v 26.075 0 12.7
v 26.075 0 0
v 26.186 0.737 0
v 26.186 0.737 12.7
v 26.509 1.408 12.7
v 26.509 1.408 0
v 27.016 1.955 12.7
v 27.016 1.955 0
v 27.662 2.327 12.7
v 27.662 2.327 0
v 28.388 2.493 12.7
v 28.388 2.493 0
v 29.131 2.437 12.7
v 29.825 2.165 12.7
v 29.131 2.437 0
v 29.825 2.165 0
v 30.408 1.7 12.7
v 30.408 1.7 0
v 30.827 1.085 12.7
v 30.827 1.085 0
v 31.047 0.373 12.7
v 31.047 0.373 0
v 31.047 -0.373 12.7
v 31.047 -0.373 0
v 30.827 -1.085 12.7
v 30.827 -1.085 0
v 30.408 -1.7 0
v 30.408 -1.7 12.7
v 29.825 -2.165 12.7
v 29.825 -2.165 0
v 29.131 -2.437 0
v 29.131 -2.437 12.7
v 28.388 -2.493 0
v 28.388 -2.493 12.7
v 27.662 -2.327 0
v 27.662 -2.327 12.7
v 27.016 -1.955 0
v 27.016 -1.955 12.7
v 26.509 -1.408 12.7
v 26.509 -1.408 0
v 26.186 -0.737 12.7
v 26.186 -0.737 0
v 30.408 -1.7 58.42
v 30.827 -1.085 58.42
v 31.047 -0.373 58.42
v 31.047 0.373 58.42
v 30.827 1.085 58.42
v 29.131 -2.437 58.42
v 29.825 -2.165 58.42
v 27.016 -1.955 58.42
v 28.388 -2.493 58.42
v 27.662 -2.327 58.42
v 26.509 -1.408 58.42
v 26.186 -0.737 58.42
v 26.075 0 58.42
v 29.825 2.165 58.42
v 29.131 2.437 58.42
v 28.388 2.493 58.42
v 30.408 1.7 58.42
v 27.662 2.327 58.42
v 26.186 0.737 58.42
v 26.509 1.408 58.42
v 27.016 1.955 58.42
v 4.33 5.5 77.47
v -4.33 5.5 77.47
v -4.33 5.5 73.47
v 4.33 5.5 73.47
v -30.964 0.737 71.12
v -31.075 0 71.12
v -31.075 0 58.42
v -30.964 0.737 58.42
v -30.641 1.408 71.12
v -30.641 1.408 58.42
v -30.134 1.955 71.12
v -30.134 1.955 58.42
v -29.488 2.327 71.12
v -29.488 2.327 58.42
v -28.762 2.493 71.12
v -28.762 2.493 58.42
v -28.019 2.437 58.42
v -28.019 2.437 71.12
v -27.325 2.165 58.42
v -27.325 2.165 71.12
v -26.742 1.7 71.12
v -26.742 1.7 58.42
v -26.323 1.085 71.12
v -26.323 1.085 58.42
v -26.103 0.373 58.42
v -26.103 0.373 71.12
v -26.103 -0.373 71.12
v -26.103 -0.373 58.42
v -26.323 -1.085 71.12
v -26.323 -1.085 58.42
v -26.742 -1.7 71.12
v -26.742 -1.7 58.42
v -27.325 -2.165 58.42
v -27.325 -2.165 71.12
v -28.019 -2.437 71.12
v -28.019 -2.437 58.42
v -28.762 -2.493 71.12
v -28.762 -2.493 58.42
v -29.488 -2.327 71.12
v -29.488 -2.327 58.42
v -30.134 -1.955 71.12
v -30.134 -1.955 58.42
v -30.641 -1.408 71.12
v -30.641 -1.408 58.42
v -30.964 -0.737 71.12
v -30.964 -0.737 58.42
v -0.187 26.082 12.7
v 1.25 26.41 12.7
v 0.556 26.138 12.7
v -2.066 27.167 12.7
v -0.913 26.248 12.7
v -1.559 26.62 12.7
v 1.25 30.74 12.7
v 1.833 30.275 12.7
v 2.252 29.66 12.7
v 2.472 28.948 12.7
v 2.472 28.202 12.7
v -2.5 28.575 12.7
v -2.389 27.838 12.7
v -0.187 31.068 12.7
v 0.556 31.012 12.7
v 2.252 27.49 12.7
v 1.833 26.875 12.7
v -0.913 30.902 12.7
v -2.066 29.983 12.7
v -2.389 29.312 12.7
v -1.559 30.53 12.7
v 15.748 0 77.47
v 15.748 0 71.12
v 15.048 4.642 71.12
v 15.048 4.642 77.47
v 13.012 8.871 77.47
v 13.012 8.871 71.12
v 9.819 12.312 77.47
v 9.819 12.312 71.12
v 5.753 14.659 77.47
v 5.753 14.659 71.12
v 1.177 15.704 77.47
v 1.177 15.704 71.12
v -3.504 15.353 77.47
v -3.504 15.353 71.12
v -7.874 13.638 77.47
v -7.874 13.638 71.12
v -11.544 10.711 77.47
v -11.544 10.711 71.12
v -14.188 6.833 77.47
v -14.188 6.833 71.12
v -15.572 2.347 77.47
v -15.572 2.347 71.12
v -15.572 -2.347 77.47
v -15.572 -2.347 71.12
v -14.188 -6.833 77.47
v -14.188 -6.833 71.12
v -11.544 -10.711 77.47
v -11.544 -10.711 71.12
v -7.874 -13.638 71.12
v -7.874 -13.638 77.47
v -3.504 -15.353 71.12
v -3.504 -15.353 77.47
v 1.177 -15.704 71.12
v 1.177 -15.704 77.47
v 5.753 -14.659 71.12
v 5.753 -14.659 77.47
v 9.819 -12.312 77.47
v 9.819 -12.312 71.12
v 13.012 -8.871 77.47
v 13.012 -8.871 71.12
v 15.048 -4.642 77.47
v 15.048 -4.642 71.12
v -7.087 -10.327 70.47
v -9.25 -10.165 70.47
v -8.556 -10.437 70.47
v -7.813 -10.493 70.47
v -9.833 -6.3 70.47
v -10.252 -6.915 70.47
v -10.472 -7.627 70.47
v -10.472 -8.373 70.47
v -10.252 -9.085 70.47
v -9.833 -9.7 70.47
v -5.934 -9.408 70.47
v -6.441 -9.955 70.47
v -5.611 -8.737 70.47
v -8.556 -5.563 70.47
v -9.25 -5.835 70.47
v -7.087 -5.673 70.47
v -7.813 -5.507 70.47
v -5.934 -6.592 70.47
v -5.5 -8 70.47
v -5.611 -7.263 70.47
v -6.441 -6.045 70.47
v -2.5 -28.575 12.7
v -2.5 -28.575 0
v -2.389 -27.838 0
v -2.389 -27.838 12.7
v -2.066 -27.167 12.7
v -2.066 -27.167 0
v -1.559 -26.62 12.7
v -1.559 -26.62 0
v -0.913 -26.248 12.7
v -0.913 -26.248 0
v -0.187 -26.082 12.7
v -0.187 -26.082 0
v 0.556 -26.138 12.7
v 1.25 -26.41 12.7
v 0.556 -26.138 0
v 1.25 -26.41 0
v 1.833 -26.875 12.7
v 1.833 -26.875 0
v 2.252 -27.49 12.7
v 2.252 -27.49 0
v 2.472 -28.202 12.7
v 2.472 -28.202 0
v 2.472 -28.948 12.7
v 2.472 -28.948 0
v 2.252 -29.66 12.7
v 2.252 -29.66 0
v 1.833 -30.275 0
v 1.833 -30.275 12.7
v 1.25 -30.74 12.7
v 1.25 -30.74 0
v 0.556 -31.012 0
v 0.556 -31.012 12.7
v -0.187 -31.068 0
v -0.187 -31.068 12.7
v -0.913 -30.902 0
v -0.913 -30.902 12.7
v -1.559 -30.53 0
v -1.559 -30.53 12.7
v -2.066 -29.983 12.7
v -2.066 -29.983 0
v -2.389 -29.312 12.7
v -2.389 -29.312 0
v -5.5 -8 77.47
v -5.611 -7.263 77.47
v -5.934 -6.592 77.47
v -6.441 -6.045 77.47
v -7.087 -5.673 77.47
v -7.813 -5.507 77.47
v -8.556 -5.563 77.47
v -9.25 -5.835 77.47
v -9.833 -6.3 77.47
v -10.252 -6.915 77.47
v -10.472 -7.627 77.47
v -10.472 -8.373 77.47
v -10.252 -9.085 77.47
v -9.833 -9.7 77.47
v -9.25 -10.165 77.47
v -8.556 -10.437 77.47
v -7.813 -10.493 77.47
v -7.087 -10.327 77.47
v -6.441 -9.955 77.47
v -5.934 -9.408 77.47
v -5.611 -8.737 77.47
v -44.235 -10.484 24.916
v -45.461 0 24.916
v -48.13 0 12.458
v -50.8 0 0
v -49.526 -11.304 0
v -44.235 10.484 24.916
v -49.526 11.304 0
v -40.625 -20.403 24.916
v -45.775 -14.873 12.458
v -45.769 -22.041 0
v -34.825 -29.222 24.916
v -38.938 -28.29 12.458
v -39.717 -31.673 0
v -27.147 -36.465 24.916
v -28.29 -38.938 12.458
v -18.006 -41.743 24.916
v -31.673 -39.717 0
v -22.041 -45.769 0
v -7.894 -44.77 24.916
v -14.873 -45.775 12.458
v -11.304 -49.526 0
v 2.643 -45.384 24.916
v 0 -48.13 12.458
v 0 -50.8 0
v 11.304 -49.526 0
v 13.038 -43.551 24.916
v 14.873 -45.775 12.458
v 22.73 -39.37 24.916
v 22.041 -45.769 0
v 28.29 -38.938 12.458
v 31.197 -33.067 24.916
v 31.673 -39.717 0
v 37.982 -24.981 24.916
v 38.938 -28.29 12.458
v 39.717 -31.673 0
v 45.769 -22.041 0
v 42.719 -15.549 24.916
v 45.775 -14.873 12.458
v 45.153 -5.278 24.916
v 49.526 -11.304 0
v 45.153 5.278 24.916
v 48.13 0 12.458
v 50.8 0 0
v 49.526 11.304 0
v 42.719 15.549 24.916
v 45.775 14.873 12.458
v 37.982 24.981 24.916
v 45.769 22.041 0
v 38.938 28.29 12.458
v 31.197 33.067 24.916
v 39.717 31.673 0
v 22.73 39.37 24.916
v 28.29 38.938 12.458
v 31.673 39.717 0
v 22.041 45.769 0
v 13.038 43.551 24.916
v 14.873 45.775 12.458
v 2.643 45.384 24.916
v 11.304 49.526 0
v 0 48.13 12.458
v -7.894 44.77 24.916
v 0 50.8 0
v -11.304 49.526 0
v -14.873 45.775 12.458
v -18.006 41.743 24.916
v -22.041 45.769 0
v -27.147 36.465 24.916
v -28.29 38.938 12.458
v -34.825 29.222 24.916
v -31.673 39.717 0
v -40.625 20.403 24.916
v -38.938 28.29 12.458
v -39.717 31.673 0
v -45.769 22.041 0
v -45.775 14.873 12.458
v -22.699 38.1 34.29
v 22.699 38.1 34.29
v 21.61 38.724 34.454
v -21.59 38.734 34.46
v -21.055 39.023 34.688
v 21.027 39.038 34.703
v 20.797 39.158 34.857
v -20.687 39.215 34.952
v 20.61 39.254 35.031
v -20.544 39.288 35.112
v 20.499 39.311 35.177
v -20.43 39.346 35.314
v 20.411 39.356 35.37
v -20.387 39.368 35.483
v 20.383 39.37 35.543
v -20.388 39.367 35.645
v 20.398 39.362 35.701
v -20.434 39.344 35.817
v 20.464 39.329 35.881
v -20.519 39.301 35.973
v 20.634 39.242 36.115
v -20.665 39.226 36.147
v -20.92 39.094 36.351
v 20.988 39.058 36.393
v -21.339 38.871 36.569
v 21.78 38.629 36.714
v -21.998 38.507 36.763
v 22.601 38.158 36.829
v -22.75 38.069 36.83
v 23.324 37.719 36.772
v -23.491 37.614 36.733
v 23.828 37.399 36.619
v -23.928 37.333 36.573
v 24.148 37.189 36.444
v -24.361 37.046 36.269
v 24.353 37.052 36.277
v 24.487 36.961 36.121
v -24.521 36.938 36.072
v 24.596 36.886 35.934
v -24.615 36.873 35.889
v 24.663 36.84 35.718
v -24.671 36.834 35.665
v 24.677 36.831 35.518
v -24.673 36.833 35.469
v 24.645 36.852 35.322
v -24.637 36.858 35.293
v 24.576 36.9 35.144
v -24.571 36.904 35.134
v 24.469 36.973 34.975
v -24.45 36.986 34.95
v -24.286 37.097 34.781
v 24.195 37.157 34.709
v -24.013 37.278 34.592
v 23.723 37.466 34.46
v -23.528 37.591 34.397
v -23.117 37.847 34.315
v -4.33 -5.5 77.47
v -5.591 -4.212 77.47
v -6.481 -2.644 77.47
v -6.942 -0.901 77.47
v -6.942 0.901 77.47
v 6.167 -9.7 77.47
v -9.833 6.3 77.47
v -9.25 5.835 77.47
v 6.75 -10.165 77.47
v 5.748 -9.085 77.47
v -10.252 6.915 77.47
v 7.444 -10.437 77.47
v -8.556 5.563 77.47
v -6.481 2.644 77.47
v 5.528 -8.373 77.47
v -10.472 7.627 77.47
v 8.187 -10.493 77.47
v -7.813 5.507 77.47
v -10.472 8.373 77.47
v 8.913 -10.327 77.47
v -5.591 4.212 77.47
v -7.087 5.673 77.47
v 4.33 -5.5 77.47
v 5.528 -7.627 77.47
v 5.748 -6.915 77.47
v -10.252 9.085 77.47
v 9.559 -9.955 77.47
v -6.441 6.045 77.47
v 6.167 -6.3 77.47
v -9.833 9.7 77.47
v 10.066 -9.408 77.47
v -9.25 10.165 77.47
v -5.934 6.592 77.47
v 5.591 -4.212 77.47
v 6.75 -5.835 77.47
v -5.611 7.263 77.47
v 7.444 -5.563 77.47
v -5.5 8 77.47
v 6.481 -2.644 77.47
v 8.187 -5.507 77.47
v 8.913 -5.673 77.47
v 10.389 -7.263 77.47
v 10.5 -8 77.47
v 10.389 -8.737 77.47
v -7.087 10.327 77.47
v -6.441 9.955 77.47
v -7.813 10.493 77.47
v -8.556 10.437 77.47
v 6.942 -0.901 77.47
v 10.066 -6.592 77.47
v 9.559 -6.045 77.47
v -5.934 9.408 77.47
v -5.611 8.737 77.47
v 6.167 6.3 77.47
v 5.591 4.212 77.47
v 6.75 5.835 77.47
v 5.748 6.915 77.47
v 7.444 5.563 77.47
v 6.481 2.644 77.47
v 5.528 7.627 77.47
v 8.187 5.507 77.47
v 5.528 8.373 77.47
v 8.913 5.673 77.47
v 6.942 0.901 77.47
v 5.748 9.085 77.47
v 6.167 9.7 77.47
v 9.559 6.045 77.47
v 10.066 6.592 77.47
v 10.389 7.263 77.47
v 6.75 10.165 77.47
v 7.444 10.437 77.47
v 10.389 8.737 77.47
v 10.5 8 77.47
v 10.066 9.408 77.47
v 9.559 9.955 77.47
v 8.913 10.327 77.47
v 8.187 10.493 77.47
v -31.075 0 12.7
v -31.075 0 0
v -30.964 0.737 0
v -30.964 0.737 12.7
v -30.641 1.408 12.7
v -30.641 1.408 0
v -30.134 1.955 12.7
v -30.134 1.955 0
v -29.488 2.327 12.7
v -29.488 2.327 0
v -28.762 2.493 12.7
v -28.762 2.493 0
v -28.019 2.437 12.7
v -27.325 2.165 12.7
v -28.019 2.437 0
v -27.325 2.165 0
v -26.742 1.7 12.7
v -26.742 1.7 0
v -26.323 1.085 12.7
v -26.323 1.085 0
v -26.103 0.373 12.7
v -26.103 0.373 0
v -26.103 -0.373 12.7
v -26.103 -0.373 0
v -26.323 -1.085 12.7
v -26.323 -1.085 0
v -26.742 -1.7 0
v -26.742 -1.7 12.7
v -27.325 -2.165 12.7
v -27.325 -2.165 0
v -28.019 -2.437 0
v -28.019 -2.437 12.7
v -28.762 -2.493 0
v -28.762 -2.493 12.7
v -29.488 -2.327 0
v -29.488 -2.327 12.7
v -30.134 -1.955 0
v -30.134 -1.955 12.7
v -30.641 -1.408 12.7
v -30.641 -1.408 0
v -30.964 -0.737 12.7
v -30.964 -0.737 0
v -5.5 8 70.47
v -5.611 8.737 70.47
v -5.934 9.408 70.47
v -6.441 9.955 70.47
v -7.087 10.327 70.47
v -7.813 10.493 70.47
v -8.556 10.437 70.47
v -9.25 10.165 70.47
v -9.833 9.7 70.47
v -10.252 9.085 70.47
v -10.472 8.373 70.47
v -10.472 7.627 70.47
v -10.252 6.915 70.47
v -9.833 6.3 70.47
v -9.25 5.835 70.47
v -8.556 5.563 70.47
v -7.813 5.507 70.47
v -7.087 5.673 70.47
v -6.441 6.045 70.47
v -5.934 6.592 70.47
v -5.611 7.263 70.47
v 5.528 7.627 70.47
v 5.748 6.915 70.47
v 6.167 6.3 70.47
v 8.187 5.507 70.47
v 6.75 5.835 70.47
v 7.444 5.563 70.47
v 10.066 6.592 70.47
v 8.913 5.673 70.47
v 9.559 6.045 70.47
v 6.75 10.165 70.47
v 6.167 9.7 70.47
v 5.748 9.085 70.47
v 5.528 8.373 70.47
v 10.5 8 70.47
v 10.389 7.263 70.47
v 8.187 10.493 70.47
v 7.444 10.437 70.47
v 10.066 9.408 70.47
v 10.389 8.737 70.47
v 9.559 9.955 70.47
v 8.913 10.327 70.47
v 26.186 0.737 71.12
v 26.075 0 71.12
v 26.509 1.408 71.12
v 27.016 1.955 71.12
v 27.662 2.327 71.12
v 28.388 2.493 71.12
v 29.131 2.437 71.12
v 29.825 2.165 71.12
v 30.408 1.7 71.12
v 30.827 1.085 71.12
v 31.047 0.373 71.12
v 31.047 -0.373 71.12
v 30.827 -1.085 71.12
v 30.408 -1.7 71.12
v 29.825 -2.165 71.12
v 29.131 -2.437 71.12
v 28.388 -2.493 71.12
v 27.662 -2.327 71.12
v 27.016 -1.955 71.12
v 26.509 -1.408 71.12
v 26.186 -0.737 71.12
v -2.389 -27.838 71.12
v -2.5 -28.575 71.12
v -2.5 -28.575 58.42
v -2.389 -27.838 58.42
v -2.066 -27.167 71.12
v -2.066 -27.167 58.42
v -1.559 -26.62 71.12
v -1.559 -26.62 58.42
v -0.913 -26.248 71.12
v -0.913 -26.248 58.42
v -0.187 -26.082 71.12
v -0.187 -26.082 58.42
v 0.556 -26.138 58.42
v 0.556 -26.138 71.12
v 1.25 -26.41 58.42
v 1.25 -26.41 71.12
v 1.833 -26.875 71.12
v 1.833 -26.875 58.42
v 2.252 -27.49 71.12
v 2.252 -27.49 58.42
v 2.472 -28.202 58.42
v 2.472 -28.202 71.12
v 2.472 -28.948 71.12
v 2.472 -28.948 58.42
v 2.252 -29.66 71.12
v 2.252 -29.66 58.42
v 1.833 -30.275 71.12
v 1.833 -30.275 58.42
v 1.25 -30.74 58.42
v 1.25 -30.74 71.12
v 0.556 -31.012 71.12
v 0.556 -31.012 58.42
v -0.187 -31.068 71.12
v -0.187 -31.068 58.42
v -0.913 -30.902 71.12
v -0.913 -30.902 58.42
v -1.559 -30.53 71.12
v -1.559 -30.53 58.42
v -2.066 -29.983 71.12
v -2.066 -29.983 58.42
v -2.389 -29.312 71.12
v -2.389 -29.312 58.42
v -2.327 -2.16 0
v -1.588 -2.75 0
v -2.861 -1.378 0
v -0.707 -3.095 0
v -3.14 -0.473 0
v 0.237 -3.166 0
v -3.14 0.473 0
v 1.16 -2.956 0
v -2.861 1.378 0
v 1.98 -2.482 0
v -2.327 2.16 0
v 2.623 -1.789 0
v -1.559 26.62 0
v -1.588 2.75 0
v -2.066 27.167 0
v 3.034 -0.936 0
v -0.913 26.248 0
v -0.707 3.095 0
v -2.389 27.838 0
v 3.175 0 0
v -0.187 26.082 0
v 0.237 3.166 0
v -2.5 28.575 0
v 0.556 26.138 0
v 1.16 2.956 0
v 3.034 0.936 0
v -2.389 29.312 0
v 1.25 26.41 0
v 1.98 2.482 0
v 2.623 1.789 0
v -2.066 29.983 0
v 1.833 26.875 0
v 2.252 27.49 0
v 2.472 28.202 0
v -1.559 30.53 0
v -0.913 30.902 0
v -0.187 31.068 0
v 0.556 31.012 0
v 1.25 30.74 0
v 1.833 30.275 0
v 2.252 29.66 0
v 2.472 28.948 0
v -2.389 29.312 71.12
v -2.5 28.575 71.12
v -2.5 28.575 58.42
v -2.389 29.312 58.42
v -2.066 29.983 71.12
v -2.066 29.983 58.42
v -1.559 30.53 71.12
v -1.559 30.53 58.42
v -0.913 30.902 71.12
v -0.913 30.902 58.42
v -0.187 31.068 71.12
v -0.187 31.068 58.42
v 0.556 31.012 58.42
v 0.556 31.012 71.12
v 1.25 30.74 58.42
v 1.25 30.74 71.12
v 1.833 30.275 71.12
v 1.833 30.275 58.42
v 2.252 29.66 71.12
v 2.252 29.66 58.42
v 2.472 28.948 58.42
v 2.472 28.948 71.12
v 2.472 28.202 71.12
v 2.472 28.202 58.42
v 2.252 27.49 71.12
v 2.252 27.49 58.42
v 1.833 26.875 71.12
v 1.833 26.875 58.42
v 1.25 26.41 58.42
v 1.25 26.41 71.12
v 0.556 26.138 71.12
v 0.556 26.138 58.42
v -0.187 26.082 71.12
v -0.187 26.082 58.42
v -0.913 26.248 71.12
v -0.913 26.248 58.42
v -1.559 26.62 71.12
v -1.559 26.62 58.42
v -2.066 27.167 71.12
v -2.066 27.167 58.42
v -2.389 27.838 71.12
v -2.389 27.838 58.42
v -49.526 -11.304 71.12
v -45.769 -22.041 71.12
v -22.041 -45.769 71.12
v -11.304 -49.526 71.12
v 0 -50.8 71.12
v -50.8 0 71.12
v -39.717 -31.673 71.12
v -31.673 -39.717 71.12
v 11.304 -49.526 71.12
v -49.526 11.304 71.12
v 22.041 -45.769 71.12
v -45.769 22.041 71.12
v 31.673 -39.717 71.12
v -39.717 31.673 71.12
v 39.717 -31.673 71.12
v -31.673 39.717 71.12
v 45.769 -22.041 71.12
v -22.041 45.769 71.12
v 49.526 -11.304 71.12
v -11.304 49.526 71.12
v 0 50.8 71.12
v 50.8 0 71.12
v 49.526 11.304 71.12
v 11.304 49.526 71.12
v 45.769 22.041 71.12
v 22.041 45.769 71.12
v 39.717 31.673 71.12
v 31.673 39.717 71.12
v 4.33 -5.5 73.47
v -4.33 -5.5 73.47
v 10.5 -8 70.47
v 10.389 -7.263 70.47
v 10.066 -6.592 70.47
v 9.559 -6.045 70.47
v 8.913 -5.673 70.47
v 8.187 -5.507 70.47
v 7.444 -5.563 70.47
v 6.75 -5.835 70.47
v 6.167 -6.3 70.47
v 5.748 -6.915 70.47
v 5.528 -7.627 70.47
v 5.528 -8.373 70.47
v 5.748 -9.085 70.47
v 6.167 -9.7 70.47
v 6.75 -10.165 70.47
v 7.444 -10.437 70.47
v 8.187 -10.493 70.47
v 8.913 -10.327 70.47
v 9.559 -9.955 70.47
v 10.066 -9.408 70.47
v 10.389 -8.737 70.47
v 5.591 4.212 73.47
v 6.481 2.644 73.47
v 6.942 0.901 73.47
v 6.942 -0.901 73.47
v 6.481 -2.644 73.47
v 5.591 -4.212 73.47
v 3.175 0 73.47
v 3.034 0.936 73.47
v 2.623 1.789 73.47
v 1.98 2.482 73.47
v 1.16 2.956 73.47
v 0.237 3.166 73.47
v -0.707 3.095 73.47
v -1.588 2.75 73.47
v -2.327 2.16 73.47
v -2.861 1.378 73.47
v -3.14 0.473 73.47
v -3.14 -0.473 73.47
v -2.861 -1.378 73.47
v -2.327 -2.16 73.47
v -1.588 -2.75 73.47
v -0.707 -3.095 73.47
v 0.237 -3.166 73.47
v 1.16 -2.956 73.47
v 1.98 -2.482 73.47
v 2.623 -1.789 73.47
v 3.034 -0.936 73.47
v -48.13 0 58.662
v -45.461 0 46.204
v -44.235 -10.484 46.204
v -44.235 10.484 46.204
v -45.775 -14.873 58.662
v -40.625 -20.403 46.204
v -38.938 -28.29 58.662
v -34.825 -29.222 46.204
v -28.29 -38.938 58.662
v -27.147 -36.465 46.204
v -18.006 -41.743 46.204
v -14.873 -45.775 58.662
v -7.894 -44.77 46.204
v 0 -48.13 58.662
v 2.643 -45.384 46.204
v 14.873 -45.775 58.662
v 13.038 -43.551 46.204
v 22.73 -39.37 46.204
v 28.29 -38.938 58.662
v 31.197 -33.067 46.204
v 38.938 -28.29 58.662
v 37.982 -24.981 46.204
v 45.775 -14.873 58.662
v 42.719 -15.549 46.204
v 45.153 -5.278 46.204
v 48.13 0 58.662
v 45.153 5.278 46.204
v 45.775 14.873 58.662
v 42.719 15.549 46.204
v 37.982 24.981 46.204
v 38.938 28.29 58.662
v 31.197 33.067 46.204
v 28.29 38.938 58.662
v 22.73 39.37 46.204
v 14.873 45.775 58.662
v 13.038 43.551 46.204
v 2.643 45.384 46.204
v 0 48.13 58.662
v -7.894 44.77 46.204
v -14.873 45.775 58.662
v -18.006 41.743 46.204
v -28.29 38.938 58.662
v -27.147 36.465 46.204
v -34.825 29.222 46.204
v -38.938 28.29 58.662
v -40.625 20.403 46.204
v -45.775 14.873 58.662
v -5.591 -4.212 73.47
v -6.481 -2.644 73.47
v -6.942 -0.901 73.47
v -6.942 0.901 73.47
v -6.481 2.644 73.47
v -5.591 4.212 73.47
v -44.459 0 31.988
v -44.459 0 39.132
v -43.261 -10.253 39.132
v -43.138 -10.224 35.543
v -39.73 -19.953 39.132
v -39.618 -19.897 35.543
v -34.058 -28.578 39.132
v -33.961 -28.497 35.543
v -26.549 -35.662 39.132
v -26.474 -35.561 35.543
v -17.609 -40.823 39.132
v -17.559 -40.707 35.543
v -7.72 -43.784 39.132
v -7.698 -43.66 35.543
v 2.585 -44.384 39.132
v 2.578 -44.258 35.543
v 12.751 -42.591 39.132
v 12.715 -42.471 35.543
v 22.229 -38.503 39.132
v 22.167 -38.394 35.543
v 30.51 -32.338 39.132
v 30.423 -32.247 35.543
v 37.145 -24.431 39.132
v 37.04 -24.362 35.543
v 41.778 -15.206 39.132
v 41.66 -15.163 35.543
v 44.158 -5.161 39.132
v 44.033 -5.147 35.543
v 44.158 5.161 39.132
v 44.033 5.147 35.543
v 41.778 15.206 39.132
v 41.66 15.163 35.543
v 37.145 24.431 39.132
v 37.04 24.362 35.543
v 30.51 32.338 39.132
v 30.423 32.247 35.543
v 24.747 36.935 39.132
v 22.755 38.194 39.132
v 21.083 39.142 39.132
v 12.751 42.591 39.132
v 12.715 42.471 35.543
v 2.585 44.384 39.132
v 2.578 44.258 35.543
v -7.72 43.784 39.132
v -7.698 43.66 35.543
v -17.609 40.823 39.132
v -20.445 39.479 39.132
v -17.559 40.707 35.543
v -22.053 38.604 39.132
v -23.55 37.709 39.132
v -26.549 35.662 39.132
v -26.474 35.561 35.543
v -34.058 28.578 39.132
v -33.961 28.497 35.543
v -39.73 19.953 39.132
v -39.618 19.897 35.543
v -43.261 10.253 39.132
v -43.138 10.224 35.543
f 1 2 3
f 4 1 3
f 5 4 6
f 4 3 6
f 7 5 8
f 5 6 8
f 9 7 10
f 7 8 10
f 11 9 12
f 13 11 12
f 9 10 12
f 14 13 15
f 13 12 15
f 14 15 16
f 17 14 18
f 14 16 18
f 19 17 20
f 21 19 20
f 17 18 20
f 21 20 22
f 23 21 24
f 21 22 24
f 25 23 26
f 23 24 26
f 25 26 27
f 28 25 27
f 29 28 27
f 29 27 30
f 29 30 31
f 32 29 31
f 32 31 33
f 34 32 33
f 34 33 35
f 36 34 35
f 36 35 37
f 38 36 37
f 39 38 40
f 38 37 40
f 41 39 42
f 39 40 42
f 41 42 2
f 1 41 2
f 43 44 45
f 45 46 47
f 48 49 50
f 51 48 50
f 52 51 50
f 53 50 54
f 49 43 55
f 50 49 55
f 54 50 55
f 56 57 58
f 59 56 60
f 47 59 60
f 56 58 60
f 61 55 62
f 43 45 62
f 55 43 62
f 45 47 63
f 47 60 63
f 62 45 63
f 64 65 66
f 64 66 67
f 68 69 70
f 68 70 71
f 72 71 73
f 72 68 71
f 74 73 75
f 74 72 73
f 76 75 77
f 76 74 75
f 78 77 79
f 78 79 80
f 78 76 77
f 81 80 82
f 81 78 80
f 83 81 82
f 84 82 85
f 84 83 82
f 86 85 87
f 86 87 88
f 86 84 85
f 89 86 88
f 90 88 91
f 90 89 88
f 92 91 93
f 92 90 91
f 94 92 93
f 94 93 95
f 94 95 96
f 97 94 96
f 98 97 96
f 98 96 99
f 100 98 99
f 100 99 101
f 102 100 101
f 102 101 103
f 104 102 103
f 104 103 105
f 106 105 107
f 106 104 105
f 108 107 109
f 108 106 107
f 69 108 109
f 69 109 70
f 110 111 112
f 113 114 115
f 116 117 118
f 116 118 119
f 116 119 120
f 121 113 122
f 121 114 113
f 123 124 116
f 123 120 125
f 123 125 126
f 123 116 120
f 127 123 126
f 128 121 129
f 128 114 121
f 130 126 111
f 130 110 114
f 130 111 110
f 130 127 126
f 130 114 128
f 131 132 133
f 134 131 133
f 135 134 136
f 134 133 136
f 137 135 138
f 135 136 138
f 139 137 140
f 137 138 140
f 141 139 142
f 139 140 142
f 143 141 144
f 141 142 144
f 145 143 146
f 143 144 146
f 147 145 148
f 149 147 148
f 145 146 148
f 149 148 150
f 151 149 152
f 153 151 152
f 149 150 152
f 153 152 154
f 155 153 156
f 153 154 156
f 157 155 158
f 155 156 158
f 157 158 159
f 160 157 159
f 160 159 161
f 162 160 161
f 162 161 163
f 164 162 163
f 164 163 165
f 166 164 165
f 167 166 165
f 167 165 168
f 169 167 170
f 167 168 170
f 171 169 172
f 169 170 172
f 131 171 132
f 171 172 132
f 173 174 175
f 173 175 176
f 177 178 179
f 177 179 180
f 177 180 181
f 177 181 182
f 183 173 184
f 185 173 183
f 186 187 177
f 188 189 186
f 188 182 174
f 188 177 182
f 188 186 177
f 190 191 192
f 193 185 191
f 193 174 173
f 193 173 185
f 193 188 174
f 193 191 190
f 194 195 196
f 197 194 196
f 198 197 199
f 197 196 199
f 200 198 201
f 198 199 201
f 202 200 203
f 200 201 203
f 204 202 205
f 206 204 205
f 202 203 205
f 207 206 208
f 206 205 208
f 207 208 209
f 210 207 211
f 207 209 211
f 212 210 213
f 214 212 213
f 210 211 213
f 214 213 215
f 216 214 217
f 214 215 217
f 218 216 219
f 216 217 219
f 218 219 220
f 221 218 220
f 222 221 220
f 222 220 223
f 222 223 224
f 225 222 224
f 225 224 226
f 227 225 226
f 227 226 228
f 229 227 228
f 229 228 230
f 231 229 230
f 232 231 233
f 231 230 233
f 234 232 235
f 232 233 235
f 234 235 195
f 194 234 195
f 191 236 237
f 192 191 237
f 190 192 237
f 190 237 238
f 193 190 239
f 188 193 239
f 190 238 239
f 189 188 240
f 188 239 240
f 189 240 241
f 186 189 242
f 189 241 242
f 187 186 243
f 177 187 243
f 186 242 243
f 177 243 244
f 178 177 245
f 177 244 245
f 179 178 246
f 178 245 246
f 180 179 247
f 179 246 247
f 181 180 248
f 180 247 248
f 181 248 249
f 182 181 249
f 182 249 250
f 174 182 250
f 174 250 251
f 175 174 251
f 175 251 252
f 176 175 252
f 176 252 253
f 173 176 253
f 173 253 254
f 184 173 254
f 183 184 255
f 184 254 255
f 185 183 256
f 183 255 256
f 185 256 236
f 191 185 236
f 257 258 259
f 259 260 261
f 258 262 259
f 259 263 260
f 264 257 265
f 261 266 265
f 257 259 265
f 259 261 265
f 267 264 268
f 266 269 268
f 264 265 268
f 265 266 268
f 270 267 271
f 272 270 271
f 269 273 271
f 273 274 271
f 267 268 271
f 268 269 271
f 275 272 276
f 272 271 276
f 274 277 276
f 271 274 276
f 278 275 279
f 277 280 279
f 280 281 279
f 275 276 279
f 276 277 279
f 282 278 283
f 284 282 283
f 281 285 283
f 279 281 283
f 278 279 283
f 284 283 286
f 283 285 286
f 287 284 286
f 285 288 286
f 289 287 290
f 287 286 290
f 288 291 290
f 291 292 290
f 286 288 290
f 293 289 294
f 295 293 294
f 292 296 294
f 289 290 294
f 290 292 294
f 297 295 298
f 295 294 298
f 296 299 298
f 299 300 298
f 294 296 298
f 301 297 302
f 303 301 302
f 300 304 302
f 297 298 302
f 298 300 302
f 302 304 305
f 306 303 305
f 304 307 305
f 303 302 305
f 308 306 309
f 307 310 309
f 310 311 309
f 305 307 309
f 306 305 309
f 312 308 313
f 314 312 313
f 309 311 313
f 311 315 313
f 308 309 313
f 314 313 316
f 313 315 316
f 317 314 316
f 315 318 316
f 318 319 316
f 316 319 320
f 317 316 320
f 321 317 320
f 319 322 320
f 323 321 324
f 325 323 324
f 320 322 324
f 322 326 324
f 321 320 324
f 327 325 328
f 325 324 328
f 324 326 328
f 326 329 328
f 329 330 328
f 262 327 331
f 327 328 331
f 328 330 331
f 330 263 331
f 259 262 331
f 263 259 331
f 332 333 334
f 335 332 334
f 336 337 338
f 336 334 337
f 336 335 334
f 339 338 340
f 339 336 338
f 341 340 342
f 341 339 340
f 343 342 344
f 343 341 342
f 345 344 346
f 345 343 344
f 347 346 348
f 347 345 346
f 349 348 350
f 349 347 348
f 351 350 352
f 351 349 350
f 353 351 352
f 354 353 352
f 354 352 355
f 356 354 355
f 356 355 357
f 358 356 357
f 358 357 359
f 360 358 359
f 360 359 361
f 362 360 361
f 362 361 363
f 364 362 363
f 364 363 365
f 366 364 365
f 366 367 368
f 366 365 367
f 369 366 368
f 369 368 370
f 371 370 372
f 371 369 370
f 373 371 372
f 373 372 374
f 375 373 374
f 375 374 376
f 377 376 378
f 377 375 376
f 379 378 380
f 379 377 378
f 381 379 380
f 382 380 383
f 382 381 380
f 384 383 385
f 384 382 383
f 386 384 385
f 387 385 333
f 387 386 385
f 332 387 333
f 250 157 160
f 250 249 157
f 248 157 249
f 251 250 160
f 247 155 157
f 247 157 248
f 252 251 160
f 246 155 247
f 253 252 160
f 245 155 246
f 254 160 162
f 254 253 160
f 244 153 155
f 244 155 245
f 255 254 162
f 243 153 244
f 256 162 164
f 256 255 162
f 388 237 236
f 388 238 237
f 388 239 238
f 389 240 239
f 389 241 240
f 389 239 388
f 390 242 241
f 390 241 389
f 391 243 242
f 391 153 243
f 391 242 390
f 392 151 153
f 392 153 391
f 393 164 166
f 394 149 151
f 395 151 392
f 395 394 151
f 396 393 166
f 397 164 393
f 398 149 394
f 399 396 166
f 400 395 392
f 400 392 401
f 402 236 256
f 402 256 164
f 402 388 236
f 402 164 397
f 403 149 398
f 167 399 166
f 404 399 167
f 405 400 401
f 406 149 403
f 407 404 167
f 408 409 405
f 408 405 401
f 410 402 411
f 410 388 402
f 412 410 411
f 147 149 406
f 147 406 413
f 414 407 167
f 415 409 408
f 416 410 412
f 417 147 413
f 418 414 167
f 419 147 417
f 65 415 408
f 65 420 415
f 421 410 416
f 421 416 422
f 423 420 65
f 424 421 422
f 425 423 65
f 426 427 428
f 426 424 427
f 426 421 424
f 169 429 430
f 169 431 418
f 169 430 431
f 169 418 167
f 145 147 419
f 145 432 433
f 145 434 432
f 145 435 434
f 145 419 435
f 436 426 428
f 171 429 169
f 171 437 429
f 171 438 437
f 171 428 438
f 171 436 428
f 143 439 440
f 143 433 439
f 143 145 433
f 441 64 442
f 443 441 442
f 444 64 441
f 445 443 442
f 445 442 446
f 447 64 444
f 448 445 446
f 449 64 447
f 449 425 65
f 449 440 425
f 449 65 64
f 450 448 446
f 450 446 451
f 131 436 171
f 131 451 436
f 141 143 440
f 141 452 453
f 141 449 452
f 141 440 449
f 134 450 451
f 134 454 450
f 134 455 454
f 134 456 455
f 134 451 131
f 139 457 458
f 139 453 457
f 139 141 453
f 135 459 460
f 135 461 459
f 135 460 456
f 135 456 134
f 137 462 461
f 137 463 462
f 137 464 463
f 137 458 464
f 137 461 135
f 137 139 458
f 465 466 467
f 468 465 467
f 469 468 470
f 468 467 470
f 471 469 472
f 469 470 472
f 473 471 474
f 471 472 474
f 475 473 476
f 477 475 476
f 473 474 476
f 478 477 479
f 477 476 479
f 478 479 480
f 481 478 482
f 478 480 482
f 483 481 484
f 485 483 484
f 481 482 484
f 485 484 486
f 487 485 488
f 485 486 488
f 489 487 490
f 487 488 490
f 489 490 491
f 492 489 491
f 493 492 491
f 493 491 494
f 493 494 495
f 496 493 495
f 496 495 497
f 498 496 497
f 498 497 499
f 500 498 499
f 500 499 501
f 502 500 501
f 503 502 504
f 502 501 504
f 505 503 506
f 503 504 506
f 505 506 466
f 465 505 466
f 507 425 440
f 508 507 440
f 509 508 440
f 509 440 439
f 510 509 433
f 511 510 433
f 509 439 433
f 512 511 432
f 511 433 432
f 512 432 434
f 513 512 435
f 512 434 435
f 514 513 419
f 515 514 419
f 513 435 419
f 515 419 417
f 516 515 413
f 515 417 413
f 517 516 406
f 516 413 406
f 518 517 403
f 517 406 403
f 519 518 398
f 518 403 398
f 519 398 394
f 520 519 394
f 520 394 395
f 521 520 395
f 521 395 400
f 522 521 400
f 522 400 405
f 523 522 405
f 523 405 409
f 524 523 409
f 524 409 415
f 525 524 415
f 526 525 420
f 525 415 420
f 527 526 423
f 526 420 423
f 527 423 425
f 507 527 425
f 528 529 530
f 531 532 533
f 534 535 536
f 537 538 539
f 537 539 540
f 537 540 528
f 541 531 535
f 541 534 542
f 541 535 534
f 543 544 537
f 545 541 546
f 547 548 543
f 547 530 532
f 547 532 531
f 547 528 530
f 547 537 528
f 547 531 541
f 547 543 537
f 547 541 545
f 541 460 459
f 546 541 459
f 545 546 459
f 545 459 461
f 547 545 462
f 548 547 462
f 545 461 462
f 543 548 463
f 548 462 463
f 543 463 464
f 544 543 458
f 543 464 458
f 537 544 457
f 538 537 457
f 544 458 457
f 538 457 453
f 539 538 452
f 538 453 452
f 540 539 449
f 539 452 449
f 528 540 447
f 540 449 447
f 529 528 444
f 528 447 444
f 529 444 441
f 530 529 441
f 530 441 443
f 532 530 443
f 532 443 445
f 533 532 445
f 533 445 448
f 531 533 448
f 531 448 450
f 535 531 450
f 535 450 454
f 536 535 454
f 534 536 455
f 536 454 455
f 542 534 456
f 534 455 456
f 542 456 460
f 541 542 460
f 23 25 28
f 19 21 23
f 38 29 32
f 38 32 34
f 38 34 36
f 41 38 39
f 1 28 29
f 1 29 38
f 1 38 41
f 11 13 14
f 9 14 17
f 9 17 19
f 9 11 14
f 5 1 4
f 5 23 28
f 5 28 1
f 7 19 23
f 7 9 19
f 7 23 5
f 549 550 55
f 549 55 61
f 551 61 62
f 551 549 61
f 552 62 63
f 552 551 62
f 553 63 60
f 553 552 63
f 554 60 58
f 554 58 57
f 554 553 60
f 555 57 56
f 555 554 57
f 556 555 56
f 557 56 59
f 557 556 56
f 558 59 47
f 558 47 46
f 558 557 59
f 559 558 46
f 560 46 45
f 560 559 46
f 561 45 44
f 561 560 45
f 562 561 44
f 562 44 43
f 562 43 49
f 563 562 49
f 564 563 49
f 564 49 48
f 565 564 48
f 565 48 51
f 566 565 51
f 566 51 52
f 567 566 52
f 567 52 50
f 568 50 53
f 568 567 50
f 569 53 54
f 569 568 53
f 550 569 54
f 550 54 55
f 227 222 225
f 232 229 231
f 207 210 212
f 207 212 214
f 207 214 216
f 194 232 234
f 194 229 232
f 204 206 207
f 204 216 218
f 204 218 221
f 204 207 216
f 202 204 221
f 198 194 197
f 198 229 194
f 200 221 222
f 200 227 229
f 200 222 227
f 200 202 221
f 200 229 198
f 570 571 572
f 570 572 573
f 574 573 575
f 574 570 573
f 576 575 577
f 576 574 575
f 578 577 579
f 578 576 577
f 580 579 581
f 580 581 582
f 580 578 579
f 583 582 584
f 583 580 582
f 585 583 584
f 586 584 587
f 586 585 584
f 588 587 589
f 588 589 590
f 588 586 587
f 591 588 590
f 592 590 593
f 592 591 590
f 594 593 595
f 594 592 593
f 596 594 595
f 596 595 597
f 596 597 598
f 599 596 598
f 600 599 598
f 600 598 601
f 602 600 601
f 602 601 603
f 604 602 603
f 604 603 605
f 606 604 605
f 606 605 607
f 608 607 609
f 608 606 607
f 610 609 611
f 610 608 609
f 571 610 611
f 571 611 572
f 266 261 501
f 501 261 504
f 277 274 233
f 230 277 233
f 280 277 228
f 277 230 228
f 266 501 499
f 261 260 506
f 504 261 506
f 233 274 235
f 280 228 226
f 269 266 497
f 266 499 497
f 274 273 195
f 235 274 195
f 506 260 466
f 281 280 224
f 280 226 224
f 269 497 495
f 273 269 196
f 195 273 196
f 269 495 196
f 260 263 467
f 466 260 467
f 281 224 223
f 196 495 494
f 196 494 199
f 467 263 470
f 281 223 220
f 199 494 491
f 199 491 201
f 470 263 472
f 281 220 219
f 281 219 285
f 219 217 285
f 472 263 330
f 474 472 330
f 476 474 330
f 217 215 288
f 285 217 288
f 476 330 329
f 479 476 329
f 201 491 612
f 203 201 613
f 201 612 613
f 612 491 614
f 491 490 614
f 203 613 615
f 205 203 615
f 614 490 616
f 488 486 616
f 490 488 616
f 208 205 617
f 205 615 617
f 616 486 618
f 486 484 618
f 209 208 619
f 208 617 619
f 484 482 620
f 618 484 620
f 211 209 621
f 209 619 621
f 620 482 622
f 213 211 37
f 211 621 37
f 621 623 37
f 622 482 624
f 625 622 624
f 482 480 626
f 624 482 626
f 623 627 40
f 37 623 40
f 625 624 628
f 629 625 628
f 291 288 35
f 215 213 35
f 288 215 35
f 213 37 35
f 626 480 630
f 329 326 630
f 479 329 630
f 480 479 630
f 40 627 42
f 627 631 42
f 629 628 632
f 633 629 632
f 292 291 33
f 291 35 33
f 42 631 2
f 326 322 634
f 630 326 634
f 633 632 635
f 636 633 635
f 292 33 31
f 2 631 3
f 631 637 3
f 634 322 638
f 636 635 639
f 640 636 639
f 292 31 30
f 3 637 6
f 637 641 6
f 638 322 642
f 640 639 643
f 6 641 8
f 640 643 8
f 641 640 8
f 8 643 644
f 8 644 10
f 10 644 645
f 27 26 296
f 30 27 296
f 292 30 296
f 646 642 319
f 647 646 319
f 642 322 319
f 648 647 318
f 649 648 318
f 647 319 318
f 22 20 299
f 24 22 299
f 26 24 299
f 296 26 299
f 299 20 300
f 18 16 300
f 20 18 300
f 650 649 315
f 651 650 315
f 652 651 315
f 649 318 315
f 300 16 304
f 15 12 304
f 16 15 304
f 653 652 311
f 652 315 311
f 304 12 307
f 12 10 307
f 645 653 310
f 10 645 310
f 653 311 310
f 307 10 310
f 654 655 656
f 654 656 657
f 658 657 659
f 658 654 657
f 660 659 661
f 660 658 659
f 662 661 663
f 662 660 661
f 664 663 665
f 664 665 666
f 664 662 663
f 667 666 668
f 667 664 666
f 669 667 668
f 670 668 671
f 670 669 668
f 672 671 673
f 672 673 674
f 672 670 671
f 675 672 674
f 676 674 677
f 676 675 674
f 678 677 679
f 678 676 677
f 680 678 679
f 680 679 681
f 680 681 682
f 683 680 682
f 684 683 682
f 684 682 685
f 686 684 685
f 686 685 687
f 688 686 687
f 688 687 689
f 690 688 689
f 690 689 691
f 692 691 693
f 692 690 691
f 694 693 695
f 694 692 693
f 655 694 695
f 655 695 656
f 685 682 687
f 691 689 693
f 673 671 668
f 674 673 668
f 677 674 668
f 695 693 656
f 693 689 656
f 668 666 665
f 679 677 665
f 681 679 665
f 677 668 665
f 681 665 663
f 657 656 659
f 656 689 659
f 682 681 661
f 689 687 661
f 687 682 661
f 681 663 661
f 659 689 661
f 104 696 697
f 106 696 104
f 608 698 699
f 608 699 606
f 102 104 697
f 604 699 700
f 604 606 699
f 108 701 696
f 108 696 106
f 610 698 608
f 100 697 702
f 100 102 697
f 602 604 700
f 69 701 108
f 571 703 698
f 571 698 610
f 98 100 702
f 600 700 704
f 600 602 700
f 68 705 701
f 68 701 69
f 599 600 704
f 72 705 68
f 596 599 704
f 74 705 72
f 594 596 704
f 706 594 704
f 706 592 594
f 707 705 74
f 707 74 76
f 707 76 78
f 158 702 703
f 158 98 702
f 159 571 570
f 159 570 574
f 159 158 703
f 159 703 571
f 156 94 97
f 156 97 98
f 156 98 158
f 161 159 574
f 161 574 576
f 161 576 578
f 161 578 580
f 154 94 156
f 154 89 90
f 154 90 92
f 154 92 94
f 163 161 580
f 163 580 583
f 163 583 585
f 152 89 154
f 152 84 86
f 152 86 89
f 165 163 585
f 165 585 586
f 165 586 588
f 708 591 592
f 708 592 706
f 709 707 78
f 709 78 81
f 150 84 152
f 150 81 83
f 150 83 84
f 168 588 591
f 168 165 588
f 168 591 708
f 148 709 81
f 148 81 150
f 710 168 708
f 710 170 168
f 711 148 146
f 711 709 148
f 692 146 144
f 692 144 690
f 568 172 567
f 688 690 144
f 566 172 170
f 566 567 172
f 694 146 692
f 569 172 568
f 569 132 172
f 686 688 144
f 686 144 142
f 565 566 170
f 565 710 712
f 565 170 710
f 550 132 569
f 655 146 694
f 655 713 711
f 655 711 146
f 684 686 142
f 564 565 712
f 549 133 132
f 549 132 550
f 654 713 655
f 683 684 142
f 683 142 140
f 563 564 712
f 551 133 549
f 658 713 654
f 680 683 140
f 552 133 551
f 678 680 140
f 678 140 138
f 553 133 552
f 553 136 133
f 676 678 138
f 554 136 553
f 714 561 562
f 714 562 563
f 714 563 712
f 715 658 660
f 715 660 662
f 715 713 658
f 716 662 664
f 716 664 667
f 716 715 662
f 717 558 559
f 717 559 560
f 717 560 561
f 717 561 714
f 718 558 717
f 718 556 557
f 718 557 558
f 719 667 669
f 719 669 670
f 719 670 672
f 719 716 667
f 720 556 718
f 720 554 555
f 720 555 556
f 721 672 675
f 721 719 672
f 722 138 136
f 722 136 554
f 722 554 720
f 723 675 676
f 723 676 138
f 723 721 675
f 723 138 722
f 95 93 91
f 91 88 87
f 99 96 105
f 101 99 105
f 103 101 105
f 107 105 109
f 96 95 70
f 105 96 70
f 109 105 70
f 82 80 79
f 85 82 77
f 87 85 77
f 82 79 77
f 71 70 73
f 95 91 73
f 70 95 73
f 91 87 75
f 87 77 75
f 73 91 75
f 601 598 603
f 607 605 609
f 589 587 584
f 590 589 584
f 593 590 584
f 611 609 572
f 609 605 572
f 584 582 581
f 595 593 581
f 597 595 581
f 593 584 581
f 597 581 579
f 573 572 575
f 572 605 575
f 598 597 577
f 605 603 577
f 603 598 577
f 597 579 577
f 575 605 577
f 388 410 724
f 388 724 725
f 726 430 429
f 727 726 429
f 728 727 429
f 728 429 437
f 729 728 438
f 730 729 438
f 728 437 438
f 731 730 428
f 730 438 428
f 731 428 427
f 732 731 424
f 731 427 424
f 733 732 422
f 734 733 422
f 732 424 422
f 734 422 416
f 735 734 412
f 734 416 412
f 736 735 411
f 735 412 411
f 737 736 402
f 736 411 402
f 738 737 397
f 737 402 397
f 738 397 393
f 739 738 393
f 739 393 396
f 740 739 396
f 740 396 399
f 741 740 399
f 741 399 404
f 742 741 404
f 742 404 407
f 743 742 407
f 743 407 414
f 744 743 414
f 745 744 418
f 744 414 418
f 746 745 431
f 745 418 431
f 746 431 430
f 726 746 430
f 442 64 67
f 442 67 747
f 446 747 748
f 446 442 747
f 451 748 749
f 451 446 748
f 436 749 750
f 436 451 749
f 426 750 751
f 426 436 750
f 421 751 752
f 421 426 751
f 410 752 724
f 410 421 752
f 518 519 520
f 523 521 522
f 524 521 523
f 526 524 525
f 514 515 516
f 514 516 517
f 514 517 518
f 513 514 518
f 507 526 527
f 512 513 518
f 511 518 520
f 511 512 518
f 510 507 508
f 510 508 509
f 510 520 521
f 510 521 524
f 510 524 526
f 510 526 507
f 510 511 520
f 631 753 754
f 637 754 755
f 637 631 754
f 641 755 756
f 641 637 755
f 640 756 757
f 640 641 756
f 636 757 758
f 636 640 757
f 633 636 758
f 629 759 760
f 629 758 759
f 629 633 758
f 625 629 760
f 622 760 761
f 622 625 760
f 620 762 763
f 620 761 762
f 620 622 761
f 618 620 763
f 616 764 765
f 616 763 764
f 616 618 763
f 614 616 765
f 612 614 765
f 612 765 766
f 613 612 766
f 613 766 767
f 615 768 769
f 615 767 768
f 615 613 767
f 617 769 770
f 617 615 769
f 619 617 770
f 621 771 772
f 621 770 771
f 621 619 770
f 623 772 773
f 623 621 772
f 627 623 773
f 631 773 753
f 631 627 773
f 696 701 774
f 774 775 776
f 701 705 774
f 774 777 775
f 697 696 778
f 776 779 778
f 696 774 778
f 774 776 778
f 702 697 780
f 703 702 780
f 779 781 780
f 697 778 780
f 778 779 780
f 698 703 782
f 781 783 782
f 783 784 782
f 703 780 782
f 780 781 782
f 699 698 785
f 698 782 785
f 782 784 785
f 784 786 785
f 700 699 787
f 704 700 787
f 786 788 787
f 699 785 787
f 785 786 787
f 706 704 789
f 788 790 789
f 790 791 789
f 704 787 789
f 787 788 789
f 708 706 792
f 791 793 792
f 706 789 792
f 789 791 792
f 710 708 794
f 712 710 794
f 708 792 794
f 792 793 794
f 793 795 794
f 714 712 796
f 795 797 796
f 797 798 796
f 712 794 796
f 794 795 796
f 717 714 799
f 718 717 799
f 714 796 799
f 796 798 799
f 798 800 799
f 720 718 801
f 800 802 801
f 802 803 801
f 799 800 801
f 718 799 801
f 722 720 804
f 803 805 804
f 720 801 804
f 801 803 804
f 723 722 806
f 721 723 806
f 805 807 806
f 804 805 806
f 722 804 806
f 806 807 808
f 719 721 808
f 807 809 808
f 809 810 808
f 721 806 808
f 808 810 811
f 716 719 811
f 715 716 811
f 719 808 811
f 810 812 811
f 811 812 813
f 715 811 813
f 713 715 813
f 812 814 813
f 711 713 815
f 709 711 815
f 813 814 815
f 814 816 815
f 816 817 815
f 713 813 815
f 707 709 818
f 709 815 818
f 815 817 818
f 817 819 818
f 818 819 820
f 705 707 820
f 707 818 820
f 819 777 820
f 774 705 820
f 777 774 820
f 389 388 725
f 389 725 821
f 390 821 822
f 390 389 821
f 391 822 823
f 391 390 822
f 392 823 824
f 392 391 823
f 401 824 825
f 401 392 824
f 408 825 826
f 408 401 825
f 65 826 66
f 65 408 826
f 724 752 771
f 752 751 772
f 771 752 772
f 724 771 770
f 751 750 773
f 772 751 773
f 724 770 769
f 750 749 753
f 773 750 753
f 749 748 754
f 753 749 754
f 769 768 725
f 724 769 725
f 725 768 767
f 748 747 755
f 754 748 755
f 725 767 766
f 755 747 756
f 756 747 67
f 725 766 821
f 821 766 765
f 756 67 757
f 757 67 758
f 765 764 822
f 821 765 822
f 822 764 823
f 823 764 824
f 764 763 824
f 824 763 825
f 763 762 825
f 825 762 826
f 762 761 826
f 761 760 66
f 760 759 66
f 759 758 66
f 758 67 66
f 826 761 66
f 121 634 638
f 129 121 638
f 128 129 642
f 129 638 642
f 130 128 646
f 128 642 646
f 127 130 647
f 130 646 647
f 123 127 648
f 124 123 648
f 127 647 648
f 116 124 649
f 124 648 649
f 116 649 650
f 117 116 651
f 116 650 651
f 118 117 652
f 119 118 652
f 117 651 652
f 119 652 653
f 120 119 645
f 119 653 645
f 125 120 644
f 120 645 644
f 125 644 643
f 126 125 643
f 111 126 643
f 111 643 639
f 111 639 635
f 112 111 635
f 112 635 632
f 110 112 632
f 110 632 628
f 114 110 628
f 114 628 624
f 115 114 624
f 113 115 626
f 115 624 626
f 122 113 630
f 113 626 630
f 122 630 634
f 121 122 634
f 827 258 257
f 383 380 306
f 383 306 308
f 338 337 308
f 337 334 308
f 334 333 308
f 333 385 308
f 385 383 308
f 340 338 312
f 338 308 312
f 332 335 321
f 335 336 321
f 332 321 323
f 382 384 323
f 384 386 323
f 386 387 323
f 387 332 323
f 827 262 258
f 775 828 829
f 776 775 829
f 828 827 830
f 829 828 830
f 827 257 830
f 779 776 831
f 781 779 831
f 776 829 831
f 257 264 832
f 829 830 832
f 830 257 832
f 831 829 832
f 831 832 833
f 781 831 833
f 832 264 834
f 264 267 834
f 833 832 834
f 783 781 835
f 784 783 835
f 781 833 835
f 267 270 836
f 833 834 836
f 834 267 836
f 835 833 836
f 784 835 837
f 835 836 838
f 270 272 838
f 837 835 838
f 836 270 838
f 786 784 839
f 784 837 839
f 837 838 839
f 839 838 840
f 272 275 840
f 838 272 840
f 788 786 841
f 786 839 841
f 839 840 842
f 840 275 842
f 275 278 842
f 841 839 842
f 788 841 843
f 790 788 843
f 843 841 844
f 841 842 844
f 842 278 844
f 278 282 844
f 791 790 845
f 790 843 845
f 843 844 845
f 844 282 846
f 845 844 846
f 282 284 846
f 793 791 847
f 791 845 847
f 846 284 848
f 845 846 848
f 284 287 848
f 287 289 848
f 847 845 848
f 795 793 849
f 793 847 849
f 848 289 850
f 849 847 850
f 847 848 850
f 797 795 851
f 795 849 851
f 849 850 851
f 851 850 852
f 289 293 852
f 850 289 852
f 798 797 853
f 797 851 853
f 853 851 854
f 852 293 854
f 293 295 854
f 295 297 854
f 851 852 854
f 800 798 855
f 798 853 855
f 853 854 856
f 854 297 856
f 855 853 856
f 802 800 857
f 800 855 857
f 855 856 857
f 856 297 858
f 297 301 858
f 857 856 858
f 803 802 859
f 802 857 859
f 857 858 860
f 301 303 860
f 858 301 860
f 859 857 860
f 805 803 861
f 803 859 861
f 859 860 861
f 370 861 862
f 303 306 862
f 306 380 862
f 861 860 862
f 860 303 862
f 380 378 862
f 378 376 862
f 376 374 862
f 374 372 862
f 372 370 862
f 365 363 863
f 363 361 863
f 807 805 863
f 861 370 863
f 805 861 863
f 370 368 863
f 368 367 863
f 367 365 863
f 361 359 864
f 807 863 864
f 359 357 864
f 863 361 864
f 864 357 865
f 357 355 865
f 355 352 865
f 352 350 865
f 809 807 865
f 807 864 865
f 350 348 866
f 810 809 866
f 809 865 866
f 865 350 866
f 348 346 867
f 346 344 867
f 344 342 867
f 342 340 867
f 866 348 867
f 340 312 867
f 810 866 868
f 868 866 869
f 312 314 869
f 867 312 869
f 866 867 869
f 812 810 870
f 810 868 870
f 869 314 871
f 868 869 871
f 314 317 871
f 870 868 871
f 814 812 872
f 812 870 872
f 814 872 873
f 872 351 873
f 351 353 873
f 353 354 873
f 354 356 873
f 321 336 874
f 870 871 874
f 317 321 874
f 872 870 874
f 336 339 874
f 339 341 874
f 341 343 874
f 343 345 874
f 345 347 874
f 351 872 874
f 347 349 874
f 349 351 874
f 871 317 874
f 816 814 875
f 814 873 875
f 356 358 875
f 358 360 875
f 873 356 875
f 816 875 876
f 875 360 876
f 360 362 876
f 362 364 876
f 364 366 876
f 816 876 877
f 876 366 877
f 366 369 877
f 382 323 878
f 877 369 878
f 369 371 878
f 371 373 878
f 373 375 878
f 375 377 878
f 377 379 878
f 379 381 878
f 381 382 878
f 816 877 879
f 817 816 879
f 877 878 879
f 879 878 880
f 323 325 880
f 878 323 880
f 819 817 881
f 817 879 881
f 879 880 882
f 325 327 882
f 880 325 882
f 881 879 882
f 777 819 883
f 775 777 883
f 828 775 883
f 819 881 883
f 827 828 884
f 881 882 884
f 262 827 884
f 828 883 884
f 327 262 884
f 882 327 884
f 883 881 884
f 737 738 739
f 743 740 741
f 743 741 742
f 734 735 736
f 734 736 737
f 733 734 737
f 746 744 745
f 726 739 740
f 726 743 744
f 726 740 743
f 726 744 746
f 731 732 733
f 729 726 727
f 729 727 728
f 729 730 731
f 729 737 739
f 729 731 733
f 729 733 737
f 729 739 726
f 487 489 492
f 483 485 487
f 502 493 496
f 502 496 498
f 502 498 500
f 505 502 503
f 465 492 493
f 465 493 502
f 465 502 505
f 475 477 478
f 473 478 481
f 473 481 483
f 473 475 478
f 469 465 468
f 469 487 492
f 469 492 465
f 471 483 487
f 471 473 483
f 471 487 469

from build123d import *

# Parameters (mm, degrees)
SKETCH1_R               = 50.8
SKETCH1_R_2             = 3.175
BOSS_EXTRUDE1_DEPTH     = 71.12
CUT_EXTRUDE1_DEPTH      = 102.09072361
CUT_EXTRUDE1_DEPTH_BACK = 102.09072361
SKETCH2_R               = 1.27
SKETCH7_R               = 2.5
CUT_EXTRUDE4_DEPTH      = 12.7
SKETCH8_R               = 15.748
SKETCH8_R_2             = 3.175
BOSS_EXTRUDE2_DEPTH     = 6.35
CUT_EXTRUDE6_DEPTH      = 4
SKETCH6_R               = 2.5
CUT_EXTRUDE7_DEPTH      = 7


with BuildPart() as part:
    # Sketch1 → Boss-Extrude1 (new body)
    with BuildSketch(Plane.XY):
        Circle(SKETCH1_R)
        Circle(SKETCH1_R_2, mode=Mode.SUBTRACT)
    extrude(amount=BOSS_EXTRUDE1_DEPTH)

    # Sketch2 → Cut-Extrude1 (cut, two sides: drawn at the far end of the back side and taken through both)
    with BuildSketch(Plane(origin=(0, 0, 0), x_dir=(0, 0, -1), z_dir=(1, 0, 0)).offset(-CUT_EXTRUDE1_DEPTH_BACK)):
        with Locations((-35.56, 38.1)):
            Circle(SKETCH2_R)
    extrude(amount=CUT_EXTRUDE1_DEPTH + CUT_EXTRUDE1_DEPTH_BACK, mode=Mode.SUBTRACT)

    # Sketch7 → Cut-Extrude4 (cut)
    with BuildSketch(Plane(origin=(0, 0, 0), x_dir=(-1, 0, 0), z_dir=(0, 0, -1))):
        with Locations((28.575, 0)):
            Circle(SKETCH7_R)
        with Locations((0, 28.575)):
            Circle(SKETCH7_R)
        with Locations((-28.575, 0)):
            Circle(SKETCH7_R)
        with Locations((0, -28.575)):
            Circle(SKETCH7_R)
    cut_extrude4 = extrude(amount=-CUT_EXTRUDE4_DEPTH, mode=Mode.SUBTRACT)

    # Mirror1: Cut-Extrude4 across plane
    add(cut_extrude4.mirror(Plane.XY.offset(35.56)), mode=Mode.SUBTRACT)

    # Sketch8 → Boss-Extrude2 (add)
    with BuildSketch(Plane.XY.offset(71.12)):
        Circle(SKETCH8_R)
        Circle(SKETCH8_R_2, mode=Mode.SUBTRACT)
    extrude(amount=BOSS_EXTRUDE2_DEPTH)

    # Sketch5 → Cut-Extrude6 (cut)
    with BuildSketch(Plane.XY.offset(77.47)):
        with BuildLine():
            Line((-4.330127019, 5.5), (4.330127019, 5.5))
            ThreePointArc((4.330127019, 5.5), (7, 0), (4.330127019, -5.5))
            Line((4.330127019, -5.5), (-4.330127019, -5.5))
            ThreePointArc((-4.330127019, -5.5), (-7, 0), (-4.330127019, 5.5))
        make_face()
    extrude(amount=-CUT_EXTRUDE6_DEPTH, mode=Mode.SUBTRACT)

    # Sketch6 → Cut-Extrude7 (cut)
    with BuildSketch(Plane.XY.offset(77.47)):
        with Locations((-8, 8)):
            Circle(SKETCH6_R)
        with Locations((8, 8)):
            Circle(SKETCH6_R)
        with Locations((8, -8)):
            Circle(SKETCH6_R)
        with Locations((-8, -8)):
            Circle(SKETCH6_R)
    extrude(amount=-CUT_EXTRUDE7_DEPTH, mode=Mode.SUBTRACT)

    # Sketch9 → Cut-Revolve1 (revolve, cut)
    with BuildSketch(Plane(origin=(0, 0, 0), x_dir=(0, 0, -1), z_dir=(1, 0, 0)), mode=Mode.PRIVATE) as cut_revolve1_sk:
        with BuildLine():
            Line((-71.12, 50.8), (-46.204077708, 45.460873794))
            ThreePointArc((-46.204077708, 45.460873794), (-35.56, 44.33323643), (-24.915922292, 45.460873794))
            Line((-24.915922292, 45.460873794), (0, 50.8))
            Line((0, 50.8), (-71.12, 50.8))
        make_face()
    revolve(cut_revolve1_sk.sketch.rotate(Axis((0, 0, -3.8735), (0, 0, 1)), 90), axis=Axis((0, 0, -3.8735), (0, 0, 1)), mode=Mode.SUBTRACT)


solid = part.part
